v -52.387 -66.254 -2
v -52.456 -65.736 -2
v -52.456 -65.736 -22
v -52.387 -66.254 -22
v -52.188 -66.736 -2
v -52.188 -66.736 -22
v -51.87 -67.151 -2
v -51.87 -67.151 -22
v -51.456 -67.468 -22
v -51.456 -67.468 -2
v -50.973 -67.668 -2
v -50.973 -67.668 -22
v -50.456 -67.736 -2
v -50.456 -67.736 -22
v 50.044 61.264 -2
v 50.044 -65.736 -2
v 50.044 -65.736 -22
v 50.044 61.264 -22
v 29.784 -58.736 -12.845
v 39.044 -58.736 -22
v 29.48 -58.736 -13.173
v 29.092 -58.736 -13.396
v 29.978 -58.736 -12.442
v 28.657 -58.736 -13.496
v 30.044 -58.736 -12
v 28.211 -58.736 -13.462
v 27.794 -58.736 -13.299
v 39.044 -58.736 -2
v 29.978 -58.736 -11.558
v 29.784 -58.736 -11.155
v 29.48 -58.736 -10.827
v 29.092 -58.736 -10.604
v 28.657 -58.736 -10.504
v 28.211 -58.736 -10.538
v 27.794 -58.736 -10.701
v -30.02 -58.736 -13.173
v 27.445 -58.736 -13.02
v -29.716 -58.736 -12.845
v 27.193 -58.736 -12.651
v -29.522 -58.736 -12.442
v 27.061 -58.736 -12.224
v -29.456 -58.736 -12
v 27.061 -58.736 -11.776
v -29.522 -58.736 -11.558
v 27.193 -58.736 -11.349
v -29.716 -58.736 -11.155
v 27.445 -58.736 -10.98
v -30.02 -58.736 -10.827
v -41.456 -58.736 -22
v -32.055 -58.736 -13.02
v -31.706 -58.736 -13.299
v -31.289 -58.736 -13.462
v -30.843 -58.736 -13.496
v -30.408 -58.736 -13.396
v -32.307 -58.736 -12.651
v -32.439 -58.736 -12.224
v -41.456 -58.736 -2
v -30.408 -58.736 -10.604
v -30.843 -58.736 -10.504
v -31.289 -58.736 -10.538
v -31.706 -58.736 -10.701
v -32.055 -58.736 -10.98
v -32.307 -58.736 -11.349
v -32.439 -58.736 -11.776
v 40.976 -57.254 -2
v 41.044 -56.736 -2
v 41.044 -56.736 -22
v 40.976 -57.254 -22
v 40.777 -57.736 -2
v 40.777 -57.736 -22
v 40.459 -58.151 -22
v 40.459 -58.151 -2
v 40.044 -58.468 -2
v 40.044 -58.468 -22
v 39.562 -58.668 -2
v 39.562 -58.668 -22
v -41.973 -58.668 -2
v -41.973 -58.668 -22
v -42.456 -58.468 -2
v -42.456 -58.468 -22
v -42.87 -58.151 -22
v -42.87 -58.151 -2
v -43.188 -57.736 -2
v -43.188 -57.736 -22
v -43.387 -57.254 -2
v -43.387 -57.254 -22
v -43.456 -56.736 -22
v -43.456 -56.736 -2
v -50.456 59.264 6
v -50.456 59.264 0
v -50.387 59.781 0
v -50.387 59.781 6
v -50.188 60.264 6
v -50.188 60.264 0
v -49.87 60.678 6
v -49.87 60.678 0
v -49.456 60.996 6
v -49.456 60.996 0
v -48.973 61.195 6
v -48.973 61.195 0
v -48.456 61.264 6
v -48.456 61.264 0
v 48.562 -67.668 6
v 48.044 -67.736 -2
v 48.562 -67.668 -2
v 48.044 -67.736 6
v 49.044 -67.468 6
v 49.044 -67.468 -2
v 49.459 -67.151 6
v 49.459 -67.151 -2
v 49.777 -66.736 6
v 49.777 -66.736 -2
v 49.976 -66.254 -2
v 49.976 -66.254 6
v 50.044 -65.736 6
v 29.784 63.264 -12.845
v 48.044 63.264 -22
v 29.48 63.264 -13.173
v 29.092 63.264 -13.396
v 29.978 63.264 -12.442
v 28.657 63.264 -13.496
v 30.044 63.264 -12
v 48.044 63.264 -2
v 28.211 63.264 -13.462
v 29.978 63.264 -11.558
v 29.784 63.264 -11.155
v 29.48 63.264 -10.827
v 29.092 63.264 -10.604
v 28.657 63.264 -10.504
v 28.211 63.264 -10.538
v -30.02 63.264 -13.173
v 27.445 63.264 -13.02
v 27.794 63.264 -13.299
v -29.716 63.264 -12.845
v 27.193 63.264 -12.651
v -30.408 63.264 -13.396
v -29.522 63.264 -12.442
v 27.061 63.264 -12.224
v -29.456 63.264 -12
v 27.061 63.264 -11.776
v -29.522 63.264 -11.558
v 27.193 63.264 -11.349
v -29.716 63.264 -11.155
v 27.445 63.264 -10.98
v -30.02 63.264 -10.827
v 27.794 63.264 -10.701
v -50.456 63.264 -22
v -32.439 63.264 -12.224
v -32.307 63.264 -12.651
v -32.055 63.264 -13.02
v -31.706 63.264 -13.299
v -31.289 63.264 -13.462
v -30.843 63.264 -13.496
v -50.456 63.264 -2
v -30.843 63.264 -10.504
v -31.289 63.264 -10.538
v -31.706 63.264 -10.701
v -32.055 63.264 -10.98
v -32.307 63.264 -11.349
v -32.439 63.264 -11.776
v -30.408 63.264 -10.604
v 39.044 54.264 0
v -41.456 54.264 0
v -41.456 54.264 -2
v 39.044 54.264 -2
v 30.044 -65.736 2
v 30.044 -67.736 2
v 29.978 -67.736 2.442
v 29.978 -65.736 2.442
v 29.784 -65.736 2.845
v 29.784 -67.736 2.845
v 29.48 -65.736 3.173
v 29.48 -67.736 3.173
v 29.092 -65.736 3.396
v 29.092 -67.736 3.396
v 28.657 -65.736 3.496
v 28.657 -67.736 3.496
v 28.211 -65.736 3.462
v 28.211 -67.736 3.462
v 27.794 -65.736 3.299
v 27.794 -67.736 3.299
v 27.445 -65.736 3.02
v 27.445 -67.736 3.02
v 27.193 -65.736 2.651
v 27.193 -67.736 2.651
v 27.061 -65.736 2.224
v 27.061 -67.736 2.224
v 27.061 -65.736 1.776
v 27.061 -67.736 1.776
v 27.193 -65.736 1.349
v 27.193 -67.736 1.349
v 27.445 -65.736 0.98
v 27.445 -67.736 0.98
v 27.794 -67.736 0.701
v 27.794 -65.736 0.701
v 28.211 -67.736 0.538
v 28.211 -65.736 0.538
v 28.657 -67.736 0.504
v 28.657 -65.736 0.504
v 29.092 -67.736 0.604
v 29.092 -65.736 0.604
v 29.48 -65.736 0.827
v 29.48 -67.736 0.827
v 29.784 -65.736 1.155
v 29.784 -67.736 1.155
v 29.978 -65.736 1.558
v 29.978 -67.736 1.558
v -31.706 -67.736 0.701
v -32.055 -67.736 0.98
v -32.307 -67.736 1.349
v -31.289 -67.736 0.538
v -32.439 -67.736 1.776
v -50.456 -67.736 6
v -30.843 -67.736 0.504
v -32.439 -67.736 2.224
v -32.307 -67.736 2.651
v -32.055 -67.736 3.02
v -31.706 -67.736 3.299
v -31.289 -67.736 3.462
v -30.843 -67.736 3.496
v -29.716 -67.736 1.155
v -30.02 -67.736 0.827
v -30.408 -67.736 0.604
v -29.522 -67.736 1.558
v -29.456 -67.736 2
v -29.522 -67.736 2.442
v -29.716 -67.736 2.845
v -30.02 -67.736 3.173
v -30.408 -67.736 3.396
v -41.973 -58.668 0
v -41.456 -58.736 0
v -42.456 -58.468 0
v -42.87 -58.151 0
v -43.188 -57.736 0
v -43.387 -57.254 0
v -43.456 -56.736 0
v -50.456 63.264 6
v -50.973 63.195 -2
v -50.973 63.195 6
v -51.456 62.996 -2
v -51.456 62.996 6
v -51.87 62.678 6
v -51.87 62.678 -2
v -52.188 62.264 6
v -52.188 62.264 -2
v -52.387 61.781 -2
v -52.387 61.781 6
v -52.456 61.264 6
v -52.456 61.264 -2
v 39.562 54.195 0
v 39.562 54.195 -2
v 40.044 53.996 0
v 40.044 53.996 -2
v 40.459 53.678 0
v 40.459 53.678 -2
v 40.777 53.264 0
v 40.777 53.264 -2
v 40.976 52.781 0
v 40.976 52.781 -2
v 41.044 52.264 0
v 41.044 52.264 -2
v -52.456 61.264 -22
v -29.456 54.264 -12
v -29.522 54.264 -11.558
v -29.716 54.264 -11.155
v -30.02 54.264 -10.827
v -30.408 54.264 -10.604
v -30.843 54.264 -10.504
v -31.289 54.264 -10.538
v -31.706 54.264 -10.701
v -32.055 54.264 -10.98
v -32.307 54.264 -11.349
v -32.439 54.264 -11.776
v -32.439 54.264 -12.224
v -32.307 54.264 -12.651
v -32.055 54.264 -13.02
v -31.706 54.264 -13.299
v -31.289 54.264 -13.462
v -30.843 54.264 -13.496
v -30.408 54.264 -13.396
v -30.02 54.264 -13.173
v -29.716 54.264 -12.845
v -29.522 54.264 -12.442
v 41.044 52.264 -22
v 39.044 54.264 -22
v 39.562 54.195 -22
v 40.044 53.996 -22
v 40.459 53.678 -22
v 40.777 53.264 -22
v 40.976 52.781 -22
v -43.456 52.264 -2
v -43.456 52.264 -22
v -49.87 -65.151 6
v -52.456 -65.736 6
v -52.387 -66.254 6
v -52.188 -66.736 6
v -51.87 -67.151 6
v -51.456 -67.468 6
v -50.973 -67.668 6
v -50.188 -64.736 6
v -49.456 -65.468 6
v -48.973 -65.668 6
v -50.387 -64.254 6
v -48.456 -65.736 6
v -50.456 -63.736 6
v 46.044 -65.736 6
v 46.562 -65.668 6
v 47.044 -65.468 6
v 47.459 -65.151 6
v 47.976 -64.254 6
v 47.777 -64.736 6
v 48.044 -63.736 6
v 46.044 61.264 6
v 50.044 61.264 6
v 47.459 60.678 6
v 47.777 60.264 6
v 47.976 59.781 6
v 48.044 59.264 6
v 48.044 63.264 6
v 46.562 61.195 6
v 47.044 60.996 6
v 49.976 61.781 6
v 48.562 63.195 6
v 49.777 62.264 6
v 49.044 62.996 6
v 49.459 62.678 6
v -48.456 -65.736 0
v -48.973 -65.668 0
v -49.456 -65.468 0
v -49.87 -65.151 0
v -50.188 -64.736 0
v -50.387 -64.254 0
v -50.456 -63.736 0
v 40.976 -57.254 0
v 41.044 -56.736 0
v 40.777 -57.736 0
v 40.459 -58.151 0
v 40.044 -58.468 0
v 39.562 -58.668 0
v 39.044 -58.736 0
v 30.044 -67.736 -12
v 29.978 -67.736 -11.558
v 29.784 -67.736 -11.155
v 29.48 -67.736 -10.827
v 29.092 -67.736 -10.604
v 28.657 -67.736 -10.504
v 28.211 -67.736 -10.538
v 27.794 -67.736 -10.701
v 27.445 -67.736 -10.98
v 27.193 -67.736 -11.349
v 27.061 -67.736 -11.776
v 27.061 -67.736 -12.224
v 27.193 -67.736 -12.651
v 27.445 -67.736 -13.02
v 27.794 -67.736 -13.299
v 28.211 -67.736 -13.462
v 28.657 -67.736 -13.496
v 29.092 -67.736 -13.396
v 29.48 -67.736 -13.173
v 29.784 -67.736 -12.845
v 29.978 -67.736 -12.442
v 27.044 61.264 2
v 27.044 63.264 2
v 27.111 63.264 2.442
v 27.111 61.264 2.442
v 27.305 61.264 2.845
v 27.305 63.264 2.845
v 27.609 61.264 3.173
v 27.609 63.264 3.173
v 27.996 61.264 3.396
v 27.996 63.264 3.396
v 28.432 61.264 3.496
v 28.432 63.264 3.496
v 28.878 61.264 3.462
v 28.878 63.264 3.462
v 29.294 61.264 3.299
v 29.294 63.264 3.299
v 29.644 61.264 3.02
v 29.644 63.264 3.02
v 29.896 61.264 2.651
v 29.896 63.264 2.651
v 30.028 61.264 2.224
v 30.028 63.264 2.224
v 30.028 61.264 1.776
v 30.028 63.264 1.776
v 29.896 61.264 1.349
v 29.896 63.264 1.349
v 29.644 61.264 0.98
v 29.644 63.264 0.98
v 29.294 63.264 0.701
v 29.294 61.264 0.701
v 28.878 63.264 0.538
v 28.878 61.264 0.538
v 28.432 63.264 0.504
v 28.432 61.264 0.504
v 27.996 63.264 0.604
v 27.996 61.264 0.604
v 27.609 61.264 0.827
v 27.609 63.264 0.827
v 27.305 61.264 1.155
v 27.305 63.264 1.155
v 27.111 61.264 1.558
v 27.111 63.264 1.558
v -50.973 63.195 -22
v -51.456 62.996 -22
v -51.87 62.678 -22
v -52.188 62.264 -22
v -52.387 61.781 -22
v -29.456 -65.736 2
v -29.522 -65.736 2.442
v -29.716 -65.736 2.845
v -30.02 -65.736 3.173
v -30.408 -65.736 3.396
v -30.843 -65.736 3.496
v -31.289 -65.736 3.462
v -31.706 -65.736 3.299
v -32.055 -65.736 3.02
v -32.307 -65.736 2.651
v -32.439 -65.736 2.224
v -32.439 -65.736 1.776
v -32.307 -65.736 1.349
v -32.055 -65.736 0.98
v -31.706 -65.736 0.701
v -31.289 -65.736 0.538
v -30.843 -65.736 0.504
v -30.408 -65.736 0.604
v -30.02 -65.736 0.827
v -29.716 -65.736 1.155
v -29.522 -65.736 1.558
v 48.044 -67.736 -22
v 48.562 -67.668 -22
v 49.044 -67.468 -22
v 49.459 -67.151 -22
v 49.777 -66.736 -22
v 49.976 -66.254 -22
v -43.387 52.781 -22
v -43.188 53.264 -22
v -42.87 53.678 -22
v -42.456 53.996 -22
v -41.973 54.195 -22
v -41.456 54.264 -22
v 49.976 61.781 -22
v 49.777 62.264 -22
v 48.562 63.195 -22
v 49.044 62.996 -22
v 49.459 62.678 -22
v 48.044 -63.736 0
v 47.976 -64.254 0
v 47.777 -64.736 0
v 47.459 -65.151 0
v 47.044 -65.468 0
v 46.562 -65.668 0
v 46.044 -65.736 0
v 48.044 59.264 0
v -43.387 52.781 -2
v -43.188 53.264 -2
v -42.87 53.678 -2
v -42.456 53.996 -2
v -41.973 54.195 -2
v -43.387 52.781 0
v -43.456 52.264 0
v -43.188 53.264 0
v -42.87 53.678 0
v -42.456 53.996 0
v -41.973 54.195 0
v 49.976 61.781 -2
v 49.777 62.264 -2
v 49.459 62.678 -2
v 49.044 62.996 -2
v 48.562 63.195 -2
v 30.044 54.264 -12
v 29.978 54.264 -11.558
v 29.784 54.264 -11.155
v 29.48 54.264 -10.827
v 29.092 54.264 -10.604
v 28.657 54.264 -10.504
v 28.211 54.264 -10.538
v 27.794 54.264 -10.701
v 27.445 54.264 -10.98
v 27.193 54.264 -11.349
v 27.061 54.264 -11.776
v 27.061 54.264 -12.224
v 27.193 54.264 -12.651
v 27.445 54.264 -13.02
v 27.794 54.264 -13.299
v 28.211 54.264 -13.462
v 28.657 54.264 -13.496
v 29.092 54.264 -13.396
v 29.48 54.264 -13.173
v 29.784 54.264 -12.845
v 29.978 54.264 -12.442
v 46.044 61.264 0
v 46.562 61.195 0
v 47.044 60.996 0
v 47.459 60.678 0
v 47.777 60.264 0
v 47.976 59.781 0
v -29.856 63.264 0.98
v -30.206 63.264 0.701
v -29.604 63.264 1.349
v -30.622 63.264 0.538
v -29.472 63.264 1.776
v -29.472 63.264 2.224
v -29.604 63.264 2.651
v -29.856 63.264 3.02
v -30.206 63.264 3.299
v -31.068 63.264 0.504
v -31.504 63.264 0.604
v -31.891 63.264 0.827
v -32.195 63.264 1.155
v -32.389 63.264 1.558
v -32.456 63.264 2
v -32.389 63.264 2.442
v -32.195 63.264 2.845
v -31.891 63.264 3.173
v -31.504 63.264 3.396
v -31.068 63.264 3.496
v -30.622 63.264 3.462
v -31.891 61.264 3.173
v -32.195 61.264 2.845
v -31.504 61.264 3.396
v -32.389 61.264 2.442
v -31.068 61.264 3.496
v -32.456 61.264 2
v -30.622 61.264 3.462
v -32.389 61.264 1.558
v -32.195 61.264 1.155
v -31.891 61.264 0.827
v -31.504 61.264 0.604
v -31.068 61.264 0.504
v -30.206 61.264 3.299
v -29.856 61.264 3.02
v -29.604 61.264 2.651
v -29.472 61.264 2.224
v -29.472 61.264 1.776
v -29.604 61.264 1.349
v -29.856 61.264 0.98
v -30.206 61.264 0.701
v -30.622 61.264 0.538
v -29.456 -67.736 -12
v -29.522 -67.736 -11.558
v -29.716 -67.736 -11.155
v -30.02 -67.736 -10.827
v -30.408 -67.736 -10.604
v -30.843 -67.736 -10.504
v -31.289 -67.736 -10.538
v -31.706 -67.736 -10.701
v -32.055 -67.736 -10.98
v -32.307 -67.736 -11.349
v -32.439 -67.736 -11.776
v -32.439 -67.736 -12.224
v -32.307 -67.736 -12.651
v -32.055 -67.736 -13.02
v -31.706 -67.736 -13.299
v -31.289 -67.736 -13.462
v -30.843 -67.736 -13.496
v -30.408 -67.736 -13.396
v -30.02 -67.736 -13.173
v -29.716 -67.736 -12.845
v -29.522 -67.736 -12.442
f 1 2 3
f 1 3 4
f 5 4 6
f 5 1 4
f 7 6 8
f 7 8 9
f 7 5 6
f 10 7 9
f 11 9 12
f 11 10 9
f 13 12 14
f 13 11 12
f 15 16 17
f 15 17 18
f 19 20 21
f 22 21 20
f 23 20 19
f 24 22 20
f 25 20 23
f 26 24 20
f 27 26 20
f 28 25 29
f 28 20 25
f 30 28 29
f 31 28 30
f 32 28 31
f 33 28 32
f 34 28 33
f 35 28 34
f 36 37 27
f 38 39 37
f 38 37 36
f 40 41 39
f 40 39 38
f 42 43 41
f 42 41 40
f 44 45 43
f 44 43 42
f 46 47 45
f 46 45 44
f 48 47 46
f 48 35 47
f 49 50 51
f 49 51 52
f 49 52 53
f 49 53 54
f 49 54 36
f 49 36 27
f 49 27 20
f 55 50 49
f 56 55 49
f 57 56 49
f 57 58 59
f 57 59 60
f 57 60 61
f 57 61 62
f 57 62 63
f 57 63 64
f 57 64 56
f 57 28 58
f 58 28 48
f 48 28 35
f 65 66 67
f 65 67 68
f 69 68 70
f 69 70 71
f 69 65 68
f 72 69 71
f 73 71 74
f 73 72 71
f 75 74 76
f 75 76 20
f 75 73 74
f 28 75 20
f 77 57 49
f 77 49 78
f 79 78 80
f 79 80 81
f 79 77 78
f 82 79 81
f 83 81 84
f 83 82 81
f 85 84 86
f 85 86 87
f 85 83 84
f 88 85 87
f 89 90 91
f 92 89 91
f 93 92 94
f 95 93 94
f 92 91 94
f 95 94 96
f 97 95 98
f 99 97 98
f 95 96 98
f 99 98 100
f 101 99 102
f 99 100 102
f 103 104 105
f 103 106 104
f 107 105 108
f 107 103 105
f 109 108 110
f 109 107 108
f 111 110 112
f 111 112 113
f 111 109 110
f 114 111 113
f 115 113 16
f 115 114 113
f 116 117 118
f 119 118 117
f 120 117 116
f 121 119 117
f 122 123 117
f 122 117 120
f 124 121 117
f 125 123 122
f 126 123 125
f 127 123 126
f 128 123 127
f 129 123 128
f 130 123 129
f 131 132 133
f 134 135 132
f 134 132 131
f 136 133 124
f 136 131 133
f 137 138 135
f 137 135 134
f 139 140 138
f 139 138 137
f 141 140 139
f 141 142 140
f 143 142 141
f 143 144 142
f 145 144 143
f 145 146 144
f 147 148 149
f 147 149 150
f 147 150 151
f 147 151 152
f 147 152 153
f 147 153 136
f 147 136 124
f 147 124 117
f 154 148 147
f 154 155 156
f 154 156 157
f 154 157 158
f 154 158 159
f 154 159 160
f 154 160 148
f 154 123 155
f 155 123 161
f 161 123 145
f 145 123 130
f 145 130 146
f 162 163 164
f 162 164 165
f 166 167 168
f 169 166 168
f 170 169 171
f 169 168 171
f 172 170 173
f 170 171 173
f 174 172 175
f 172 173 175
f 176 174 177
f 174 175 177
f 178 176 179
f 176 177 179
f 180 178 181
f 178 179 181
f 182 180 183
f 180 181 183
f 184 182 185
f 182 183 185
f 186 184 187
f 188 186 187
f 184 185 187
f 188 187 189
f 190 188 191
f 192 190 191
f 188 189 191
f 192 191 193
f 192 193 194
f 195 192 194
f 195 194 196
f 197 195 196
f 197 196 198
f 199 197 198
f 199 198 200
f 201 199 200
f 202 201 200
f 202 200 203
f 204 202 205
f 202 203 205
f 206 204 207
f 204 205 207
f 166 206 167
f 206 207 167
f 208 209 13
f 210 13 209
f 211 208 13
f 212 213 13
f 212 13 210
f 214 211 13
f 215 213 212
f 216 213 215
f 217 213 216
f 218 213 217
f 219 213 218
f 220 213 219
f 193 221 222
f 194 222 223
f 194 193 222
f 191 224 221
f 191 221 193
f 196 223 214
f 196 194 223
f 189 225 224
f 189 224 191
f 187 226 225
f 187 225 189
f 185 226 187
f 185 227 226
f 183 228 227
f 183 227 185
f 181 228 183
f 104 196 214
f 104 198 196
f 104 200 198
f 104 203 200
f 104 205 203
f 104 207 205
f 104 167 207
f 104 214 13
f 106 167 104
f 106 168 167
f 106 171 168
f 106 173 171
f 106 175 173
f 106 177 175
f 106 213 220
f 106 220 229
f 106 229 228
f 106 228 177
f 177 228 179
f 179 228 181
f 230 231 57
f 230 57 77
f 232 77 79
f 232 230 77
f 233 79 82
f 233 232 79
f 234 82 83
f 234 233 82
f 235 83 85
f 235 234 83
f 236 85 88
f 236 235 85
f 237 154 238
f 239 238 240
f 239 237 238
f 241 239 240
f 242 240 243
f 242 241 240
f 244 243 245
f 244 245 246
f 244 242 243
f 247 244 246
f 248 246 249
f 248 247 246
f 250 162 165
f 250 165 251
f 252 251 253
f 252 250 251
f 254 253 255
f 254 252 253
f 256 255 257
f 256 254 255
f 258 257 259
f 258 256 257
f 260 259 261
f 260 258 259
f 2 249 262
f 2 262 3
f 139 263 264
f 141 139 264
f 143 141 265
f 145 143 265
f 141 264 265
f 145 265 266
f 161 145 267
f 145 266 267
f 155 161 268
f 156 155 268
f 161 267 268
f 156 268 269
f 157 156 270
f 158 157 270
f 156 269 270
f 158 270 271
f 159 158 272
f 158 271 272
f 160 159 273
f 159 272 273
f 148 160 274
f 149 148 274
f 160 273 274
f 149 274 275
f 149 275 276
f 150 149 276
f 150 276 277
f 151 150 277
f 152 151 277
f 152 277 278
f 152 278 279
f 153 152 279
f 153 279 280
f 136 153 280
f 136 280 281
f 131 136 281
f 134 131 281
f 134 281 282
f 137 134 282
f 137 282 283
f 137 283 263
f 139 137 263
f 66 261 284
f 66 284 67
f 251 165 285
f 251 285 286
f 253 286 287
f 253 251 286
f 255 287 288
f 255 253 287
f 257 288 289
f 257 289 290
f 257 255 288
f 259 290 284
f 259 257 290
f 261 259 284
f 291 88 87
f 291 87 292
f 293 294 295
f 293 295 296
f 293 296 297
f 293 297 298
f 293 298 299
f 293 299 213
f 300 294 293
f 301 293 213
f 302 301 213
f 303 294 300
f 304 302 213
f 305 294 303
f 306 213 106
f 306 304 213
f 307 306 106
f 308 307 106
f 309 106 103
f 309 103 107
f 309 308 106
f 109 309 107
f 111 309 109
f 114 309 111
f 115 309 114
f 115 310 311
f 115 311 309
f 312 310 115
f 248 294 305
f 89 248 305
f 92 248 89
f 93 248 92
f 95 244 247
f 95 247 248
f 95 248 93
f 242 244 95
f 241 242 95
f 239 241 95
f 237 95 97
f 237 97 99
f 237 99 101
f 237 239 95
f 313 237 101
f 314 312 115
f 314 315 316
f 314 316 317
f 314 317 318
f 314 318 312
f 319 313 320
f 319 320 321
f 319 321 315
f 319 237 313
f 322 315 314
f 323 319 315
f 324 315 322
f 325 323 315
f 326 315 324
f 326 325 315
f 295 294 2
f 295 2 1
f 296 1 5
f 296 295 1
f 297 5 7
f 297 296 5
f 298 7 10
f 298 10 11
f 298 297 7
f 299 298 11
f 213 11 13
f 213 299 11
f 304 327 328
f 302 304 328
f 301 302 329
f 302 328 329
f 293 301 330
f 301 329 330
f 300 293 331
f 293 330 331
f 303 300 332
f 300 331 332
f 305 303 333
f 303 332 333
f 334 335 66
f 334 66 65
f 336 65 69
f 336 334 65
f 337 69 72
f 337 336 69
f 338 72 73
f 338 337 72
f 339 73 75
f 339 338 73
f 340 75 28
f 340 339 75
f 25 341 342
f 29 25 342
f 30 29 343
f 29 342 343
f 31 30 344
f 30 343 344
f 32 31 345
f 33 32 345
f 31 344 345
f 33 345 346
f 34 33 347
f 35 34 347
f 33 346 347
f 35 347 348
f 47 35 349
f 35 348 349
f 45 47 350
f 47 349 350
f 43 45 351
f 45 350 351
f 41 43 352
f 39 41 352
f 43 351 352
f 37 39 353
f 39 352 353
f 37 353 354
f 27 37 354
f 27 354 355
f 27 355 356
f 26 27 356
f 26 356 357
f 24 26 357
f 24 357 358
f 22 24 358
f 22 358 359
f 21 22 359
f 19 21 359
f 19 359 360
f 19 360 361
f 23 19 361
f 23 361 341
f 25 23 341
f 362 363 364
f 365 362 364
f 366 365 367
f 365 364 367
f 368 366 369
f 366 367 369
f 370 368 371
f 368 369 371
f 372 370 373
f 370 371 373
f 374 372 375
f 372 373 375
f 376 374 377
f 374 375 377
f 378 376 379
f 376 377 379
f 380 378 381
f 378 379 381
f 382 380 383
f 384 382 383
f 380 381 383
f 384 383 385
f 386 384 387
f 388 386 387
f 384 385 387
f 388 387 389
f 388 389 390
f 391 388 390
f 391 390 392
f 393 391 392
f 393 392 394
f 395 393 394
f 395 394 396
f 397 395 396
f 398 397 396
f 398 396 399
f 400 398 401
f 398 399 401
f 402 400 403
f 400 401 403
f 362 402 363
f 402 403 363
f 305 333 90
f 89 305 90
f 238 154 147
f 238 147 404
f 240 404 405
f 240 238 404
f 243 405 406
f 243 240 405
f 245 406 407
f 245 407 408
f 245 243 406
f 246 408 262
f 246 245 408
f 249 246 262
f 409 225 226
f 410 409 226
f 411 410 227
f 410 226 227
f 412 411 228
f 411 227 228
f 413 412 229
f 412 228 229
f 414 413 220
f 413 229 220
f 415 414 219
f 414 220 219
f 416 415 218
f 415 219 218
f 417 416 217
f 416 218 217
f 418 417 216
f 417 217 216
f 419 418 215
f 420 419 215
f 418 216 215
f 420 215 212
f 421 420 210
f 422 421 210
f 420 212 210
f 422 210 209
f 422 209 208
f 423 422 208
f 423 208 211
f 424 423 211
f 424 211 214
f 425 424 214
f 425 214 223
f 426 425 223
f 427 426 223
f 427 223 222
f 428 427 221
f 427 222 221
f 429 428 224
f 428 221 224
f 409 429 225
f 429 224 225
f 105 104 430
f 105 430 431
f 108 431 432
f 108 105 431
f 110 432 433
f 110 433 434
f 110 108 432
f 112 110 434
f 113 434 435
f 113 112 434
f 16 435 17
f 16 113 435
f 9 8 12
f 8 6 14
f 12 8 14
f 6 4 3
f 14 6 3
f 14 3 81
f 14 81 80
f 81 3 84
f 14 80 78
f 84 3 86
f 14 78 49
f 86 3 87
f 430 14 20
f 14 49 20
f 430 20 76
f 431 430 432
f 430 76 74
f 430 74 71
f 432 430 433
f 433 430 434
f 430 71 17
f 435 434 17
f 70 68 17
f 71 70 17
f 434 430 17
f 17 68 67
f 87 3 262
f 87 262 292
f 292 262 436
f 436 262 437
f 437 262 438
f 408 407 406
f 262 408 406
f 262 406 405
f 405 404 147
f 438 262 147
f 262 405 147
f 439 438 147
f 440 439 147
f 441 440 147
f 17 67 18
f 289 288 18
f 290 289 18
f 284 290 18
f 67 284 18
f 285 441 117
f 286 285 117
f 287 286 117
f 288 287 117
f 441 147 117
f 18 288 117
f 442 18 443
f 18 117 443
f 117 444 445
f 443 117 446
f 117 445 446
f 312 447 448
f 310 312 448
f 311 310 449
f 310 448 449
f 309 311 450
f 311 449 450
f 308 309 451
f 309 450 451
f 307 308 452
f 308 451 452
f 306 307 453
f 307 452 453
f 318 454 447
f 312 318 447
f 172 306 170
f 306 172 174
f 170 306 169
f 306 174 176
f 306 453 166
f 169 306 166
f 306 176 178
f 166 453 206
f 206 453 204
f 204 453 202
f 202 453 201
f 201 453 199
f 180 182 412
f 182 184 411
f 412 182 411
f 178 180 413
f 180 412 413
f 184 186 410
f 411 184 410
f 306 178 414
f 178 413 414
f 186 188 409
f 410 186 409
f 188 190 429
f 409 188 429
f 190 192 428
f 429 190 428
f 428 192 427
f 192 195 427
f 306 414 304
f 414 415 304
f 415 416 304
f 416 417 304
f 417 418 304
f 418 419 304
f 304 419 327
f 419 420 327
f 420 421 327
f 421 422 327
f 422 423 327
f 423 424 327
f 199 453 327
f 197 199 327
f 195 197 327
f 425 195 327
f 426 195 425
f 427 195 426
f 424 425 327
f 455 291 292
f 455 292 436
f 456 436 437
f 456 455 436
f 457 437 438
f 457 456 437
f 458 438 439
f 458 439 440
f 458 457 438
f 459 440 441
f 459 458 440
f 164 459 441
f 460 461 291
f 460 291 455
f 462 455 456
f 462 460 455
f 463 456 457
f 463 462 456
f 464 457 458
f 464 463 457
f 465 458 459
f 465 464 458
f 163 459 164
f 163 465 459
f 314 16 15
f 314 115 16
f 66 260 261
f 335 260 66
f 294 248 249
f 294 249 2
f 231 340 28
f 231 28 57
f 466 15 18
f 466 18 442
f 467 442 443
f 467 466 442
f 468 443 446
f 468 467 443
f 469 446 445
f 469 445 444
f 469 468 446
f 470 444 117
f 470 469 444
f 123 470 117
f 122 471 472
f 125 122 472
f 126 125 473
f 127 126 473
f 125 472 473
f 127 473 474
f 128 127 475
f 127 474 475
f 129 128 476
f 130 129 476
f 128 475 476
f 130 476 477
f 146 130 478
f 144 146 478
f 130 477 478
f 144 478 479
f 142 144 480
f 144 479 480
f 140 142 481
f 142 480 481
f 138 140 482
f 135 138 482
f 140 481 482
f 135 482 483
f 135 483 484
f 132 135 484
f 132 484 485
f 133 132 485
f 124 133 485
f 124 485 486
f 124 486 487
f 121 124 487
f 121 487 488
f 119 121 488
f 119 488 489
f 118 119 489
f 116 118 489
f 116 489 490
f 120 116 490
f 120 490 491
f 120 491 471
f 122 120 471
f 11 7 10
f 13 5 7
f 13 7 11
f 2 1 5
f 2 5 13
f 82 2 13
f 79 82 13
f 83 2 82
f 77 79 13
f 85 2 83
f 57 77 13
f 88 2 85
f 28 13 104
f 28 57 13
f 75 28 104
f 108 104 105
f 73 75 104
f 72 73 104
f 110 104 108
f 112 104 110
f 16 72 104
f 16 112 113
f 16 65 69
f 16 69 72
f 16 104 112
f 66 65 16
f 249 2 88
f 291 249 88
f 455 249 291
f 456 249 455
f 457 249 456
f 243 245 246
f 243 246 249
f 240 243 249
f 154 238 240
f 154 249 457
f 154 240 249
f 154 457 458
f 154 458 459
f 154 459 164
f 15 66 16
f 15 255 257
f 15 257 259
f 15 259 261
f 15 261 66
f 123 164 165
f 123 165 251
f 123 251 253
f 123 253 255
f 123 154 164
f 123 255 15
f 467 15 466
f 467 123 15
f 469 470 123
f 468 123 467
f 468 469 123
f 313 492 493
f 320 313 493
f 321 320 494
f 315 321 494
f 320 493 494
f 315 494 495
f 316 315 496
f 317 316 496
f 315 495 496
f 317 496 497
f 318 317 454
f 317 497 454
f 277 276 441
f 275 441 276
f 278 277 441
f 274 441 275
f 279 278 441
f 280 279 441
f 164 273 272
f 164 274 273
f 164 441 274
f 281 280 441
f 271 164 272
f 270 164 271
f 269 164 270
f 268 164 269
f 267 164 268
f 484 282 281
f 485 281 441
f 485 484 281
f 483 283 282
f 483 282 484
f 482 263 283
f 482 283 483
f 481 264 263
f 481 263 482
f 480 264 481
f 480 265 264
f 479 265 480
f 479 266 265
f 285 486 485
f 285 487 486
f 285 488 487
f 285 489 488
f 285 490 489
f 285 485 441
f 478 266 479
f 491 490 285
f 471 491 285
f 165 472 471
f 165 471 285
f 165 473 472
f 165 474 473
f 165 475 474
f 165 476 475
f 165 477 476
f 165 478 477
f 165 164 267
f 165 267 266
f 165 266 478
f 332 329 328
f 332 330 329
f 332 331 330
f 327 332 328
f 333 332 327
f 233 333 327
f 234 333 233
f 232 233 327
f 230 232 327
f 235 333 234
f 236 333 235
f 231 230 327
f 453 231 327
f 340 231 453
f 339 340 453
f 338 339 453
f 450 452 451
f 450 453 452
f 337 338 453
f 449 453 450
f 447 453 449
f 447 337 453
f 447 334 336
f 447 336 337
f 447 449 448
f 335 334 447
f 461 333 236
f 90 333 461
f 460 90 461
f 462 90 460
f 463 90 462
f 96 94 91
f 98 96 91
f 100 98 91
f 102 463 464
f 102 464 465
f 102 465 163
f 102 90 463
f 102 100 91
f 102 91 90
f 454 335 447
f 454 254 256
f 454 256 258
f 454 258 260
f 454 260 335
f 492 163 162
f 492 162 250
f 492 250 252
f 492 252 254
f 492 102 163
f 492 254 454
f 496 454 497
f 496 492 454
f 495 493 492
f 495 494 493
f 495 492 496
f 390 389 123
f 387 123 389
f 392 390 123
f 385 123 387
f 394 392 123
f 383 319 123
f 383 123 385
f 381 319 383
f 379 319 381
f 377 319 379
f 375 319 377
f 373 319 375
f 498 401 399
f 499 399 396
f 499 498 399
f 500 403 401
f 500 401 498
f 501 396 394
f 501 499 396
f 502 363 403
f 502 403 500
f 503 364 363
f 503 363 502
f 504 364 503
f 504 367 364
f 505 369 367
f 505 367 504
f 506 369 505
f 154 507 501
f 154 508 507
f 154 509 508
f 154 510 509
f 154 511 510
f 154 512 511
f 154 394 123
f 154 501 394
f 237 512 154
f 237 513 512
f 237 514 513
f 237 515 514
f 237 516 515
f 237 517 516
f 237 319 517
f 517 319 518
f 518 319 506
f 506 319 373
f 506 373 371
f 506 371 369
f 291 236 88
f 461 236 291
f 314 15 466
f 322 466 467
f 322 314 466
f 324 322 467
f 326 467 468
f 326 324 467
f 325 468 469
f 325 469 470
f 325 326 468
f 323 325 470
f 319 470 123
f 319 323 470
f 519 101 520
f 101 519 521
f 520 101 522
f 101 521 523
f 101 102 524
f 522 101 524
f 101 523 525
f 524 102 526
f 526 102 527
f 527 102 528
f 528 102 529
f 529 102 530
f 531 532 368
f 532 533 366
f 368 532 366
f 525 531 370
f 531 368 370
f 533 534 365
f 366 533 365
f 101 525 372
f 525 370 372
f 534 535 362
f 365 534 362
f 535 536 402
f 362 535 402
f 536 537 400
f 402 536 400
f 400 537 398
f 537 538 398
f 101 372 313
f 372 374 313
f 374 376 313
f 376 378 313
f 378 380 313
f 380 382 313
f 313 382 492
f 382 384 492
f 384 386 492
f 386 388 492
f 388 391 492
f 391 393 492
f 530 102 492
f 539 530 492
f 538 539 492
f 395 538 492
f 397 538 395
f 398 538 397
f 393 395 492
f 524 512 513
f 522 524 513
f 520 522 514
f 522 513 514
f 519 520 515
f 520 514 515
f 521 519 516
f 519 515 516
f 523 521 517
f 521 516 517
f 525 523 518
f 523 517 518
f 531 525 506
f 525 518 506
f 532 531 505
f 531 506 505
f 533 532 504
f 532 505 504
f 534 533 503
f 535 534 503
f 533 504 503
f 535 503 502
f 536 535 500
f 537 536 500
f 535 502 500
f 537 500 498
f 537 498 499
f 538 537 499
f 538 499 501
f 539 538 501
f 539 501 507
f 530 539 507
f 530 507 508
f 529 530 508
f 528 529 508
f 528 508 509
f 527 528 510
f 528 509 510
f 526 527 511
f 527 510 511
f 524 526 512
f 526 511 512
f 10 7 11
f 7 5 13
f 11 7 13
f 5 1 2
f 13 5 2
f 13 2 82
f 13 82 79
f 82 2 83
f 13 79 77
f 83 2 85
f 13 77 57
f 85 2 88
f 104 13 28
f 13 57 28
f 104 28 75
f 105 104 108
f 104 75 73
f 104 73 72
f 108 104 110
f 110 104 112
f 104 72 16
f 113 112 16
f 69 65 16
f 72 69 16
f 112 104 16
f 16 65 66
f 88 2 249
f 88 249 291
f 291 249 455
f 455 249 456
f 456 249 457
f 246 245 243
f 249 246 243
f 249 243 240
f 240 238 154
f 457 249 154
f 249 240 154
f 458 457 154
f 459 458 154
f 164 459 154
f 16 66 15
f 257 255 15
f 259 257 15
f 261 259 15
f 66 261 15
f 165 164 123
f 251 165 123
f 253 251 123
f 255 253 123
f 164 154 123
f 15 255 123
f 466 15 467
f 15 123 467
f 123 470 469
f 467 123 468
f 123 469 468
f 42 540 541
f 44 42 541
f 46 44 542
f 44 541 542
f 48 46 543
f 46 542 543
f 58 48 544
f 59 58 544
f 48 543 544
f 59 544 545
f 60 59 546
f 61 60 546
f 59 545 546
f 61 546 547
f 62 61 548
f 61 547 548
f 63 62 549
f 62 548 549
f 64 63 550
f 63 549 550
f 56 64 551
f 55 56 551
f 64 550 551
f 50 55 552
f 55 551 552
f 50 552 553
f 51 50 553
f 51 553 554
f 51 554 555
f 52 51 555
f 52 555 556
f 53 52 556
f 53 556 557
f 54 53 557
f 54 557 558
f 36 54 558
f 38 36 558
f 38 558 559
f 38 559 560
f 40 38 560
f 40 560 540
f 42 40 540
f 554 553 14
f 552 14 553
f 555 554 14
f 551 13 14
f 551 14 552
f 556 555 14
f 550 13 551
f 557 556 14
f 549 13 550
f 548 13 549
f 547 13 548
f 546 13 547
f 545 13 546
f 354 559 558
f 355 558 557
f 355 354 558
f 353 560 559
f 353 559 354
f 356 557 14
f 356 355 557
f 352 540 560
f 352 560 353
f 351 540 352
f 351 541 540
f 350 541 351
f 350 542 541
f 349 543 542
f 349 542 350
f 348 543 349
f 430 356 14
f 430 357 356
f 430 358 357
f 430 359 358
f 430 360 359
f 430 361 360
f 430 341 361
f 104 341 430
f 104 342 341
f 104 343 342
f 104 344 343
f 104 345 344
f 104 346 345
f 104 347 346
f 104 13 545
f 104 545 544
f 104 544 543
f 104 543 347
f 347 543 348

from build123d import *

# Parameters (mm, degrees)
F1_DEPTH  = 6
F3_DEPTH  = 2
F4_R      = 1.5
F6_DEPTH  = 2
F5_R      = 1.5
F7_DEPTH  = 2
F8_DEPTH  = 20
F9_R      = 1.5
F10_DEPTH = 135


with BuildPart() as f1:
    # F0 (on Top) → F1 (new body)
    with BuildSketch(Plane.XY):
        with BuildLine():
            Line((48.0444741547, 63.2635615916), (-50.4555258453, 63.2635615916))
            ThreePointArc((-50.4555258453, 63.2635615916), (-51.8697394077, 62.677775154), (-52.4555258453, 61.2635615916))
            Line((-52.4555258453, 61.2635615916), (-52.4555258453, -65.7364384084))
            ThreePointArc((-52.4555258453, -65.7364384084), (-51.8697394077, -67.1506519707), (-50.4555258453, -67.7364384084))
            Line((-50.4555258453, -67.7364384084), (48.0444741547, -67.7364384084))
            ThreePointArc((48.0444741547, -67.7364384084), (49.4586877171, -67.1506519707), (50.0444741547, -65.7364384084))
            Line((50.0444741547, -65.7364384084), (50.0444741547, 61.2635615916))
            ThreePointArc((50.0444741547, 61.2635615916), (49.4586877171, 62.677775154), (48.0444741547, 63.2635615916))
        make_face()
        with BuildLine():
            ThreePointArc((-50.4555258453, 59.2635615916), (-49.8697394077, 60.677775154), (-48.4555258453, 61.2635615916))
            Line((-48.4555258453, 61.2635615916), (46.0444741547, 61.2635615916))
            ThreePointArc((46.0444741547, 61.2635615916), (47.4586877171, 60.677775154), (48.0444741547, 59.2635615916))
            Line((48.0444741547, 59.2635615916), (48.0444741547, -63.7364384084))
            ThreePointArc((48.0444741547, -63.7364384084), (47.4586877171, -65.1506519707), (46.0444741547, -65.7364384084))
            Line((46.0444741547, -65.7364384084), (-48.4555258453, -65.7364384084))
            ThreePointArc((-48.4555258453, -65.7364384084), (-49.8697394077, -65.1506519707), (-50.4555258453, -63.7364384084))
            Line((-50.4555258453, -63.7364384084), (-50.4555258453, 59.2635615916))
        make_face(mode=Mode.SUBTRACT)
    extrude(amount=F1_DEPTH)

    # F2 (on Top) → F3 (join)
    with BuildSketch(Plane.XY):
        with BuildLine():
            Line((48.0444741547, 63.2635615916), (-50.4555258453, 63.2635615916))
            ThreePointArc((-50.4555258453, 63.2635615916), (-51.8697394077, 62.677775154), (-52.4555258453, 61.2635615916))
            Line((-52.4555258453, 61.2635615916), (-52.4555258453, -65.7364384084))
            ThreePointArc((-52.4555258453, -65.7364384084), (-51.8697394077, -67.1506519707), (-50.4555258453, -67.7364384084))
            Line((-50.4555258453, -67.7364384084), (48.0444741547, -67.7364384084))
            ThreePointArc((48.0444741547, -67.7364384084), (49.4586877171, -67.1506519707), (50.0444741547, -65.7364384084))
            Line((50.0444741547, -65.7364384084), (50.0444741547, 61.2635615916))
            ThreePointArc((50.0444741547, 61.2635615916), (49.4586877171, 62.677775154), (48.0444741547, 63.2635615916))
        make_face()
        with BuildLine():
            ThreePointArc((-43.4555258453, 52.2635615916), (-42.8697394077, 53.677775154), (-41.4555258453, 54.2635615916))
            Line((-41.4555258453, 54.2635615916), (39.0444741547, 54.2635615916))
            ThreePointArc((39.0444741547, 54.2635615916), (40.4586877171, 53.677775154), (41.0444741547, 52.2635615916))
            Line((41.0444741547, 52.2635615916), (41.0444741547, -56.7364384084))
            ThreePointArc((41.0444741547, -56.7364384084), (40.4586877171, -58.1506519707), (39.0444741547, -58.7364384084))
            Line((39.0444741547, -58.7364384084), (-41.4555258453, -58.7364384084))
            ThreePointArc((-41.4555258453, -58.7364384084), (-42.8697394077, -58.1506519707), (-43.4555258453, -56.7364384084))
            Line((-43.4555258453, -56.7364384084), (-43.4555258453, 52.2635615916))
        make_face(mode=Mode.SUBTRACT)
    extrude(amount=-F3_DEPTH)

    # F4 (on face) → F6 (cut)
    with BuildSketch(Plane.XZ.offset(67.7364384084)):
        with Locations((28.5444741547, 2)):
            Circle(F4_R)
        with Locations((-30.9555258453, 2)):
            Circle(F4_R)
    extrude(amount=-F6_DEPTH, mode=Mode.SUBTRACT)

    # F5 (on face) → F7 (cut)
    with BuildSketch(Plane(origin=(0, 63.2635615916, 0), x_dir=(-1, 0, 0), z_dir=(0, 1, 0))):
        with Locations((-28.5444741547, 2)):
            Circle(F5_R)
        with Locations((30.9555258453, 2)):
            Circle(F5_R)
    extrude(amount=-F7_DEPTH, mode=Mode.SUBTRACT)


with BuildPart() as f8:
    # F8 (new): a face of the model
    f8_faces = [f1.part.faces().sort_by_distance(p)[0] for p in [
        (-1.2055258453, 61.6002140633, -2),
    ]]
    extrude(f8_faces, amount=F8_DEPTH)

    # F9 (on face) → F10 (cut)
    with BuildSketch(Plane.XZ.offset(67.7364384084)):
        with Locations((28.5444741547, -12)):
            Circle(F9_R)
        with Locations((-30.9555258453, -12)):
            Circle(F9_R)
    extrude(amount=-F10_DEPTH, mode=Mode.SUBTRACT)


solid = Compound([f1.part, f8.part])
